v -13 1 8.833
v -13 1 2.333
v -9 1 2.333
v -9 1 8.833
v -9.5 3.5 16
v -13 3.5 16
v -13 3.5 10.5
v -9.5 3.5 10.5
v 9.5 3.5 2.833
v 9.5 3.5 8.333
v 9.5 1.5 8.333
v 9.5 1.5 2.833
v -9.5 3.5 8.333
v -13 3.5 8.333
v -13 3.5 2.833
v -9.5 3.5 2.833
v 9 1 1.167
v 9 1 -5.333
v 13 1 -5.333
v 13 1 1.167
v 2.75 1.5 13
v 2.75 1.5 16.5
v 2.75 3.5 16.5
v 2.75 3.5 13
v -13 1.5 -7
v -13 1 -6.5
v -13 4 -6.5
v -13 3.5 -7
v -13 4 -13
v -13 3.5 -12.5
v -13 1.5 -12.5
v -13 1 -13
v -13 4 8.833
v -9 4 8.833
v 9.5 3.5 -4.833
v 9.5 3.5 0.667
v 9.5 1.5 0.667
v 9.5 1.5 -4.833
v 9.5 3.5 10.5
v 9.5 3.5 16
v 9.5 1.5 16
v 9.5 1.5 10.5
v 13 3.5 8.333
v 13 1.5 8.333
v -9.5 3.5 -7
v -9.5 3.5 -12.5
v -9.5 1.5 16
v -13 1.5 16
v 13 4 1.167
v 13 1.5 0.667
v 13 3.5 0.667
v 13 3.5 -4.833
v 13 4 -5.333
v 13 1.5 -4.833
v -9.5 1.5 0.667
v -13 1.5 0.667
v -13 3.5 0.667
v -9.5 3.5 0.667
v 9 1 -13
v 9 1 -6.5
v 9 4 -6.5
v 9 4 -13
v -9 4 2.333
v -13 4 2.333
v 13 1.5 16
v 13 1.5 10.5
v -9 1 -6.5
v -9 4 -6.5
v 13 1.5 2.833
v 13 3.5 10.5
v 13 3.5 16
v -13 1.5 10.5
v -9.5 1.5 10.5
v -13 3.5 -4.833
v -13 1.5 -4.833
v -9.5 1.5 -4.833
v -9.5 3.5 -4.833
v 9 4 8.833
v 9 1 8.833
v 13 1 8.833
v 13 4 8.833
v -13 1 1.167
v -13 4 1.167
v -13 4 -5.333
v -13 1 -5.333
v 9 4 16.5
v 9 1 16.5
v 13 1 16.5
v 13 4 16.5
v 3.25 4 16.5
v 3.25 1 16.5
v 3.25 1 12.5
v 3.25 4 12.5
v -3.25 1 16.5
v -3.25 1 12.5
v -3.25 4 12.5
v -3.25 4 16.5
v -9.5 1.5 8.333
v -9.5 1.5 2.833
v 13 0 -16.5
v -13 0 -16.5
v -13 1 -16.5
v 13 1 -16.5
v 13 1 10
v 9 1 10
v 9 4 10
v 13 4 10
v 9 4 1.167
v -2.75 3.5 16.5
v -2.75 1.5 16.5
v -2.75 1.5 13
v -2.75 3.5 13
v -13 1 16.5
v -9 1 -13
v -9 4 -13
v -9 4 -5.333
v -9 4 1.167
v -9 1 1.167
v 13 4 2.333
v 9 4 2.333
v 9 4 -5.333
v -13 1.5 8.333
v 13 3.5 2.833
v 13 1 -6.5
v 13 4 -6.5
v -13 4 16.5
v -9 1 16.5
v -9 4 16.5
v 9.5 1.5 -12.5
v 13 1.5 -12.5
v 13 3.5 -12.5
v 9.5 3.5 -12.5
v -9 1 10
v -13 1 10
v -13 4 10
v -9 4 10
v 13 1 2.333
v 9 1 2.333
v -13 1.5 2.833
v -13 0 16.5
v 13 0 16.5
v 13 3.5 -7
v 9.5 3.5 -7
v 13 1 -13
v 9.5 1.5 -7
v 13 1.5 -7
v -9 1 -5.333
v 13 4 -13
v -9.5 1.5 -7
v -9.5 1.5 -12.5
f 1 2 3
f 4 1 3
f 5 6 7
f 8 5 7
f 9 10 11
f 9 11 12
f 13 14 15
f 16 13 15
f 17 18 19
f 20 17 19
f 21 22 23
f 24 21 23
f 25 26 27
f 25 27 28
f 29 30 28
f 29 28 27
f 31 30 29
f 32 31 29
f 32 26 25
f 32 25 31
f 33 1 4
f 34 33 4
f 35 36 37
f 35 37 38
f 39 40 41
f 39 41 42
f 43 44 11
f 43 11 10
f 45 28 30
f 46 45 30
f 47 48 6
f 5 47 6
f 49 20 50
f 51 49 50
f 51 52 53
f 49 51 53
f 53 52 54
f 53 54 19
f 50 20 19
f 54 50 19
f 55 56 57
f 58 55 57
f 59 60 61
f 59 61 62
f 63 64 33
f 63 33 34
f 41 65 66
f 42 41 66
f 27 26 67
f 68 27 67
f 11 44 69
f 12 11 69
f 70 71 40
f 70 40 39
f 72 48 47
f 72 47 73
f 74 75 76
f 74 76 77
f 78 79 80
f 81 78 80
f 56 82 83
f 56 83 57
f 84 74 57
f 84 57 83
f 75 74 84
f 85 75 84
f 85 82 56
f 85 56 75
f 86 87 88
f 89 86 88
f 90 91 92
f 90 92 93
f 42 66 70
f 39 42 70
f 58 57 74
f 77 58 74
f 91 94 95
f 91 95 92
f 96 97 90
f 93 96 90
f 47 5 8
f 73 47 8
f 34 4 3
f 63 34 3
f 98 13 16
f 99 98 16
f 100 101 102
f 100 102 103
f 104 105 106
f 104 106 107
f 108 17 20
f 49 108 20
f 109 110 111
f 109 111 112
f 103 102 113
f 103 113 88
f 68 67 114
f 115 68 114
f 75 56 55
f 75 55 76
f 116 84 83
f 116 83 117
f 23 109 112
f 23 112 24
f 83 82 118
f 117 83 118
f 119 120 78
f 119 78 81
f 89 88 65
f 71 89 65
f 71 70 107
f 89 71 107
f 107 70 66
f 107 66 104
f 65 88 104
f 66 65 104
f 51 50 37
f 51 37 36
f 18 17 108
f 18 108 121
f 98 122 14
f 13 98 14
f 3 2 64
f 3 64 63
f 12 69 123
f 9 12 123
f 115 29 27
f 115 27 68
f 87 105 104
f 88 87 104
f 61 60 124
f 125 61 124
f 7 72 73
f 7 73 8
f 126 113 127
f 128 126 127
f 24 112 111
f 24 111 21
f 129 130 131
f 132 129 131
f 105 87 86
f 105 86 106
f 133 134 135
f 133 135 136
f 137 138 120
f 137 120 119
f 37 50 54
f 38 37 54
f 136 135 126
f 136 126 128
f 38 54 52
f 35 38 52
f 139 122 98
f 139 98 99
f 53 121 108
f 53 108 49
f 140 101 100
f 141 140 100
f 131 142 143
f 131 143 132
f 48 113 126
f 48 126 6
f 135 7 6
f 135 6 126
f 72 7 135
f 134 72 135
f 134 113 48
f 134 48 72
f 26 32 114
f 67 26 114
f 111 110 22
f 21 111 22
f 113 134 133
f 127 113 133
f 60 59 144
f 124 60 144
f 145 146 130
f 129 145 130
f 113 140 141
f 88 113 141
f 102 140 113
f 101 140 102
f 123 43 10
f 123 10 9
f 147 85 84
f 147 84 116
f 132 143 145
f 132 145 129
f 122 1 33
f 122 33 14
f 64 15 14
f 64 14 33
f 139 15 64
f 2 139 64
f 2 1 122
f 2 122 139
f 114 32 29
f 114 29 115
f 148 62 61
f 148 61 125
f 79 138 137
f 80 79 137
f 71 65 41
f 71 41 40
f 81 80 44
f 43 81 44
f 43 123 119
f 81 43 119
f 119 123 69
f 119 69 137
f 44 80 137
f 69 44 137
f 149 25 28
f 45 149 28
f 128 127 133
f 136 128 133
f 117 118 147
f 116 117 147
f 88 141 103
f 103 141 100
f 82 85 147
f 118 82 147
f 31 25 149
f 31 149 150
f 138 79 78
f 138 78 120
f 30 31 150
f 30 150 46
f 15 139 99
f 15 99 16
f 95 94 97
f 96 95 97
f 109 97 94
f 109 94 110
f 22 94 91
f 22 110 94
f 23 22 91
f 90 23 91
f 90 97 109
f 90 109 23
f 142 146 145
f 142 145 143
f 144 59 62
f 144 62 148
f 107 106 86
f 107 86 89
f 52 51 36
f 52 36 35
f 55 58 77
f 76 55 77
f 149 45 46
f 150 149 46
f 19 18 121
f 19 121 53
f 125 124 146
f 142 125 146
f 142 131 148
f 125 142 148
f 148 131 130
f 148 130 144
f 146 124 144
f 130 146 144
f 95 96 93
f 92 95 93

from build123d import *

# Parameters (mm, degrees)
SKETCH1_W             = 26
SKETCH1_H             = 33
BOSS_EXTRUDE1_DEPTH   = 1
SKETCH2_W             = 4
SKETCH2_H             = 6.5
BOSS_EXTRUDE2_DEPTH   = 3
BOSS_EXTRUDE2_2_DEPTH = 3
BOSS_EXTRUDE2_3_DEPTH = 3
BOSS_EXTRUDE2_4_DEPTH = 3
BOSS_EXTRUDE2_5_DEPTH = 3
BOSS_EXTRUDE2_6_DEPTH = 3
BOSS_EXTRUDE2_7_DEPTH = 3
BOSS_EXTRUDE2_8_DEPTH = 3
SKETCH3_W             = 5.5
SKETCH3_H             = 2
CUT_EXTRUDE1_DEPTH    = 3.5
SKETCH4_W             = 6.5
SKETCH4_H             = 3
BOSS_EXTRUDE3_DEPTH   = 4
SKETCH5_W             = 5.5
SKETCH5_H             = 2
CUT_EXTRUDE2_DEPTH    = 3.5


with BuildPart() as part:
    # Sketch1 → Boss-Extrude1 (new body)
    with BuildSketch(Plane(origin=(0, 0, 0), x_dir=(1, 0, 0), z_dir=(0, 1, 0))):
        Rectangle(SKETCH1_W, SKETCH1_H)
    extrude(amount=BOSS_EXTRUDE1_DEPTH)


with BuildPart() as body_2:
    # Sketch2 → Boss-Extrude2 (new body)
    with BuildSketch(Plane(origin=(0, 1, 0), x_dir=(1, 0, 0), z_dir=(0, 1, 0))):
        with Locations((11, 9.75)):
            Rectangle(SKETCH2_W, SKETCH2_H)
    extrude(amount=BOSS_EXTRUDE2_DEPTH)


with BuildPart() as body_3:
    # Sketch2 → Boss-Extrude2 2 (new body)
    with BuildSketch(Plane(origin=(0, 1, 0), x_dir=(1, 0, 0), z_dir=(0, 1, 0))):
        with Locations((11, 2.083333333)):
            Rectangle(SKETCH2_W, SKETCH2_H)
    extrude(amount=BOSS_EXTRUDE2_2_DEPTH)


with BuildPart() as body_4:
    # Sketch2 → Boss-Extrude2 3 (new body)
    with BuildSketch(Plane(origin=(0, 1, 0), x_dir=(1, 0, 0), z_dir=(0, 1, 0))):
        with Locations((11, -5.583333333)):
            Rectangle(SKETCH2_W, SKETCH2_H)
    extrude(amount=BOSS_EXTRUDE2_3_DEPTH)


with BuildPart() as body_5:
    # Sketch2 → Boss-Extrude2 4 (new body)
    with BuildSketch(Plane(origin=(0, 1, 0), x_dir=(1, 0, 0), z_dir=(0, 1, 0))):
        with Locations((11, -13.25)):
            Rectangle(SKETCH2_W, SKETCH2_H)
    extrude(amount=BOSS_EXTRUDE2_4_DEPTH)


with BuildPart() as body_6:
    # Sketch2 → Boss-Extrude2 5 (new body)
    with BuildSketch(Plane(origin=(0, 1, 0), x_dir=(1, 0, 0), z_dir=(0, 1, 0))):
        with Locations((-11, -13.25)):
            Rectangle(SKETCH2_W, SKETCH2_H)
    extrude(amount=BOSS_EXTRUDE2_5_DEPTH)


with BuildPart() as body_7:
    # Sketch2 → Boss-Extrude2 6 (new body)
    with BuildSketch(Plane(origin=(0, 1, 0), x_dir=(1, 0, 0), z_dir=(0, 1, 0))):
        with Locations((-11, -5.583333333)):
            Rectangle(SKETCH2_W, SKETCH2_H)
    extrude(amount=BOSS_EXTRUDE2_6_DEPTH)


with BuildPart() as body_8:
    # Sketch2 → Boss-Extrude2 7 (new body)
    with BuildSketch(Plane(origin=(0, 1, 0), x_dir=(1, 0, 0), z_dir=(0, 1, 0))):
        with Locations((-11, 2.083333333)):
            Rectangle(SKETCH2_W, SKETCH2_H)
    extrude(amount=BOSS_EXTRUDE2_7_DEPTH)


with BuildPart() as body_9:
    # Sketch2 → Boss-Extrude2 8 (new body)
    with BuildSketch(Plane(origin=(0, 1, 0), x_dir=(1, 0, 0), z_dir=(0, 1, 0))):
        with Locations((-11, 9.75)):
            Rectangle(SKETCH2_W, SKETCH2_H)
    extrude(amount=BOSS_EXTRUDE2_8_DEPTH)


with BuildPart() as cut_extrude1_tool:
    # Sketch3 → Cut-Extrude1 (new body)
    with BuildSketch(Plane(origin=(13, 0, 0), x_dir=(0, 0, -1), z_dir=(1, 0, 0))):
        with Locations((2.083333333, 2.5)):
            Rectangle(SKETCH3_W, SKETCH3_H)
        with Locations((9.75, 2.5)):
            Rectangle(SKETCH3_W, SKETCH3_H)
        with Locations((-5.583333333, 2.5)):
            Rectangle(SKETCH3_W, SKETCH3_H)
        with Locations((-13.25, 2.5)):
            Rectangle(SKETCH3_W, SKETCH3_H)
    cut_extrude1 = extrude(amount=-CUT_EXTRUDE1_DEPTH)


with BuildPart() as body_2_1:
    add(body_2.part)

    # Cut-Extrude1: cut by cut_extrude1_tool
    add(cut_extrude1_tool.part, mode=Mode.SUBTRACT)


with BuildPart() as body_3_1:
    add(body_3.part)

    # Cut-Extrude1: cut by cut_extrude1_tool
    add(cut_extrude1_tool.part, mode=Mode.SUBTRACT)


with BuildPart() as body_4_1:
    add(body_4.part)

    # Cut-Extrude1: cut by cut_extrude1_tool
    add(cut_extrude1_tool.part, mode=Mode.SUBTRACT)


with BuildPart() as body_5_1:
    add(body_5.part)

    # Cut-Extrude1: cut by cut_extrude1_tool
    add(cut_extrude1_tool.part, mode=Mode.SUBTRACT)


with BuildPart() as mirror1_tool:
    # Mirror1: Cut-Extrude1 across plane
    add(cut_extrude1.mirror(Plane(origin=(0, 0, 0), x_dir=(0, 0, 1), z_dir=(1, 0, 0))))


with BuildPart() as body_6_1:
    add(body_6.part)

    # Mirror1: cut by mirror1_tool
    add(mirror1_tool.part, mode=Mode.SUBTRACT)


with BuildPart() as body_7_1:
    add(body_7.part)

    # Mirror1: cut by mirror1_tool
    add(mirror1_tool.part, mode=Mode.SUBTRACT)


with BuildPart() as body_8_1:
    add(body_8.part)

    # Mirror1: cut by mirror1_tool
    add(mirror1_tool.part, mode=Mode.SUBTRACT)


with BuildPart() as body_9_1:
    add(body_9.part)

    # Mirror1: cut by mirror1_tool
    add(mirror1_tool.part, mode=Mode.SUBTRACT)


with BuildPart() as body_10:
    # Sketch4 → Boss-Extrude3 (new body)
    with BuildSketch(Plane.XY.offset(16.5)):
        with Locations((0, 2.5)):
            Rectangle(SKETCH4_W, SKETCH4_H)
    extrude(amount=-BOSS_EXTRUDE3_DEPTH)

    # Sketch5 → Cut-Extrude2 (cut)
    with BuildSketch(Plane.XY.offset(16.5)):
        with Locations((0, 2.5)):
            Rectangle(SKETCH5_W, SKETCH5_H)
    extrude(amount=-CUT_EXTRUDE2_DEPTH, mode=Mode.SUBTRACT)


solid = Compound([part.part, body_2_1.part, body_3_1.part, body_4_1.part, body_5_1.part, body_6_1.part, body_7_1.part, body_8_1.part, body_9_1.part, body_10.part])
